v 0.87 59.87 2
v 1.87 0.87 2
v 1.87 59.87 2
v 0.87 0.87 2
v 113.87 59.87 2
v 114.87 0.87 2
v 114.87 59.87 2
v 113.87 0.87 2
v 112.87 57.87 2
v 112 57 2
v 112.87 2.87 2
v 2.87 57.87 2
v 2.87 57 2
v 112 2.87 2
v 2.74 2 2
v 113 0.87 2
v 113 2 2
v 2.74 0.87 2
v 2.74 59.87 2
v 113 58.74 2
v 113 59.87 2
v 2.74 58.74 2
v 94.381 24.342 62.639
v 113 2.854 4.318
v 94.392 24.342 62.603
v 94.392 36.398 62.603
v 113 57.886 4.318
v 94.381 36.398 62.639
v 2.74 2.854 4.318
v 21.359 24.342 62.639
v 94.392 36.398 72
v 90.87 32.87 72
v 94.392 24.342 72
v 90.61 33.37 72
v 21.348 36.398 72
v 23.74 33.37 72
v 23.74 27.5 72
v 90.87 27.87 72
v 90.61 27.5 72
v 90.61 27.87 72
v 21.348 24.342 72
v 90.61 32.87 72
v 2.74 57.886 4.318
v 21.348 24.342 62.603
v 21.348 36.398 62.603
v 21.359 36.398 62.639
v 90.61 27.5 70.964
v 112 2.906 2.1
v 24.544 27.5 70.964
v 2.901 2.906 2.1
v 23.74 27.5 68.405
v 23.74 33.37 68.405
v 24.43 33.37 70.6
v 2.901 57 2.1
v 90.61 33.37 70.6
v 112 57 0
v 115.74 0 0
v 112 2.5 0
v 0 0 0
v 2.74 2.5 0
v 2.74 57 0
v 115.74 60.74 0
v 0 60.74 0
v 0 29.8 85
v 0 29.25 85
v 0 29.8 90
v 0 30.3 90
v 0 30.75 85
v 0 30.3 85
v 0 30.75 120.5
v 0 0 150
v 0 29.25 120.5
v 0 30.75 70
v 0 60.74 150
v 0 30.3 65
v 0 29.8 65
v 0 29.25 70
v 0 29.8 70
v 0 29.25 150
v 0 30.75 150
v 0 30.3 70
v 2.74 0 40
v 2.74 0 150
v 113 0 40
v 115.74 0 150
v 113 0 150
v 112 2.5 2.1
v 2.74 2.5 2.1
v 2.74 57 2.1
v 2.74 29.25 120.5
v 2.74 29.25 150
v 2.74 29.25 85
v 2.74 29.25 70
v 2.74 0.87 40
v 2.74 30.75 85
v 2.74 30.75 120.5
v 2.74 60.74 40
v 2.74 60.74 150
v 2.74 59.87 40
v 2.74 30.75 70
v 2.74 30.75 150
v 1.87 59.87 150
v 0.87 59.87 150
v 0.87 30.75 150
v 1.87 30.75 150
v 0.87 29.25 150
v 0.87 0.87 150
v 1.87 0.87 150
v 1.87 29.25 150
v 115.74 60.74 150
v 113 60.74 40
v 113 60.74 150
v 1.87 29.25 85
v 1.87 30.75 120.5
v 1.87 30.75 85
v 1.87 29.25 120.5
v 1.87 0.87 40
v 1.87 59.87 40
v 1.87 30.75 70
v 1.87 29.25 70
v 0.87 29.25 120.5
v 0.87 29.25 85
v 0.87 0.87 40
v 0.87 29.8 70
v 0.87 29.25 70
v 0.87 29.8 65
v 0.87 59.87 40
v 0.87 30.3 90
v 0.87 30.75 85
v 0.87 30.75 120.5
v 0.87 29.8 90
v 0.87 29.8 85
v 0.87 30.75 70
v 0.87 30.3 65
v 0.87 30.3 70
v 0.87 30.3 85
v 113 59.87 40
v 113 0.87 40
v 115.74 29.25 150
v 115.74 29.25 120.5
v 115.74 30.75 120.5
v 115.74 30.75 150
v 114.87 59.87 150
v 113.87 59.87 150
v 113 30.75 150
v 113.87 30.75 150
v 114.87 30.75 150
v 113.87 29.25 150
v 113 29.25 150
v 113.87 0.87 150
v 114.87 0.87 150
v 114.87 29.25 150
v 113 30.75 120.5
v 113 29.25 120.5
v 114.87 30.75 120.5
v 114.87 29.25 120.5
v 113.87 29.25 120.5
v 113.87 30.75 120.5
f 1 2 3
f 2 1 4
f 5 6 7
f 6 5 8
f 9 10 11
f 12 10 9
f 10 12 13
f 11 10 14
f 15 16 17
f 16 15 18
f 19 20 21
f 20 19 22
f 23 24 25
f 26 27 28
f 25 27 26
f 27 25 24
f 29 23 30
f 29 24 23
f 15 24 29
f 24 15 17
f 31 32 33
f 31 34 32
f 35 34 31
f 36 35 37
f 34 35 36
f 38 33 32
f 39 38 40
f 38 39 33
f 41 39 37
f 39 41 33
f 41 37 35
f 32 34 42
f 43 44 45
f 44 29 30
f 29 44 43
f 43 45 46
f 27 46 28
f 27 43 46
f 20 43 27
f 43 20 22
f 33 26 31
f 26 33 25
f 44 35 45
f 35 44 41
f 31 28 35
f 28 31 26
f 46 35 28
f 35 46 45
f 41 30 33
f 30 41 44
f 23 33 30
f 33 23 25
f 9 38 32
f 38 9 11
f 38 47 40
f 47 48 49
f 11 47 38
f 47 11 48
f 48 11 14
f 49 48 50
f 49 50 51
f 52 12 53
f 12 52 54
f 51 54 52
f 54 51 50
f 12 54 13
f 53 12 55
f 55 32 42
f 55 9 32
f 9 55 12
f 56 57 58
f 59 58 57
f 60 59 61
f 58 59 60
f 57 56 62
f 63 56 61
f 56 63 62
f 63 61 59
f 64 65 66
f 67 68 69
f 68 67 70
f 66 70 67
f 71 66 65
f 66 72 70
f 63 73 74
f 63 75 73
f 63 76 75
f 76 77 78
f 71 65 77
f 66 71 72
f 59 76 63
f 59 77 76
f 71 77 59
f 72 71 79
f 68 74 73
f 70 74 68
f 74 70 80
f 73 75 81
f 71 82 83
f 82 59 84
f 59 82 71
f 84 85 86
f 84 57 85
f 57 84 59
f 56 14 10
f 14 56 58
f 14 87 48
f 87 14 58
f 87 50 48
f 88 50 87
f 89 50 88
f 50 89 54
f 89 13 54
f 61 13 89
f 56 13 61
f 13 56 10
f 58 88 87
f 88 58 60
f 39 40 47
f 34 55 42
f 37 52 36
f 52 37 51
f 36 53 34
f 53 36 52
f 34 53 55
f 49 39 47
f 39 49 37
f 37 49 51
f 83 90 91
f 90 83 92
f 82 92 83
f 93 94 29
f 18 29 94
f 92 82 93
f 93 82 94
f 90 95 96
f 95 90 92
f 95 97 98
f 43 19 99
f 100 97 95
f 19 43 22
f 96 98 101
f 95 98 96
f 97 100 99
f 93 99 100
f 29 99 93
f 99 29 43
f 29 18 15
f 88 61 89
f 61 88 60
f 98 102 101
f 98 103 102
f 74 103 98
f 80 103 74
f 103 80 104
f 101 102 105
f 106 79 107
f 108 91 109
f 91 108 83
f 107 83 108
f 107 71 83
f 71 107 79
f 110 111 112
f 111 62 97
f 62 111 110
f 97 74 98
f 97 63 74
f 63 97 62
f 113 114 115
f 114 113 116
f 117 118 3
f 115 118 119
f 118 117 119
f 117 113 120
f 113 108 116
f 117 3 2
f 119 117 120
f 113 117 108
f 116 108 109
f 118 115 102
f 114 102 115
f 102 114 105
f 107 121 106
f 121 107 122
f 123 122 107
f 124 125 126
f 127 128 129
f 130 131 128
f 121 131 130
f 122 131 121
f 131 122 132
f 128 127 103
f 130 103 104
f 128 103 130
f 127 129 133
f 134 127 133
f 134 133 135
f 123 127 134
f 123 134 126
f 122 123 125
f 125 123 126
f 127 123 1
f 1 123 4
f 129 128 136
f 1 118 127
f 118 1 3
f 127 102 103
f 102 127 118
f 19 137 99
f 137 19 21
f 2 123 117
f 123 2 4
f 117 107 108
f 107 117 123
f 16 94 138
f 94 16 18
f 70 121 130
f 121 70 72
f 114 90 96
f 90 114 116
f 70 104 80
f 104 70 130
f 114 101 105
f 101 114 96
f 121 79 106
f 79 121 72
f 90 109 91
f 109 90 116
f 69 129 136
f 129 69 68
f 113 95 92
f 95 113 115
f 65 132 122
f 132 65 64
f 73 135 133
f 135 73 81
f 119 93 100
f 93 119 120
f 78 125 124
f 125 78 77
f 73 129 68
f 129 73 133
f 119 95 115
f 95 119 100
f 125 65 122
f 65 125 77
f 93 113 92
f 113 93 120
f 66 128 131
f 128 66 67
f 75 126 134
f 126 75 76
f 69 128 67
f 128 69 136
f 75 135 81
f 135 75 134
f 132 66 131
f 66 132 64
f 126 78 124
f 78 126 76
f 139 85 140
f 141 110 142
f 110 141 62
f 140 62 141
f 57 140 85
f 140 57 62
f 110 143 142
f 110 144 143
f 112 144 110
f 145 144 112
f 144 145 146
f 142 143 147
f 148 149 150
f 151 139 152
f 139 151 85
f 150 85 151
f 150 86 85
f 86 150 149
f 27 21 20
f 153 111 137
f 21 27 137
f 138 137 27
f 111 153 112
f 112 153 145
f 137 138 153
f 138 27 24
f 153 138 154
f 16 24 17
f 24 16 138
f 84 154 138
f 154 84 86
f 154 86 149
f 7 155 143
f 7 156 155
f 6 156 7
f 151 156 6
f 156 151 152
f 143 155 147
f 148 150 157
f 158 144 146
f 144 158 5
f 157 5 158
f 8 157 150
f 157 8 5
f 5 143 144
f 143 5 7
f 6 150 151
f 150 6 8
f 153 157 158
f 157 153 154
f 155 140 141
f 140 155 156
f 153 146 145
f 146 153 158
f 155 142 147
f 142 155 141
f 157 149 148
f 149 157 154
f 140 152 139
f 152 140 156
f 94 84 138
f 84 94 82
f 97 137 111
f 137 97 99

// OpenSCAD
length = 110;
width = 55;
height = 70;
wall = 0.87;

module funnel(l, w, h, out = false) {
    ls = l/5; // length shrink
    ws = 5*(w/11); // width shrink
    CubePoints = [
    [  0,  0,  0 ],  //0
    [ l,  0,  0 ],  //1
    [ l,  w,  0 ],  //2
    [  0,  w,  0 ],  //3
    [  0 + ls,  0 + ws,  h ],  //4
    [  l - ls,  0 + ws,  h ],  //5
    [  l - ls,  w - ws,  h ],  //6
    [  0 + ls,  w - ws,  h ]]; //7
  
    CubeFaces = [
    [0,1,2,3],  // bottom
    [4,5,1,0],  // front
    [7,6,5,4],  // top
    [5,6,2,1],  // right
    [6,7,3,2],  // back
    [7,4,0,3]]; // left
    if(out){
        union(){
            polyhedron( CubePoints, CubeFaces );
            translate([l/2,w/2,h-5])
            cube([3/5*l+6, 2*w/11 + 2*wall, 10],true);
        }
    } else {
        polyhedron( CubePoints, CubeFaces );
    }
}

module pilar(){
    difference(){
        difference(){
            cube([2*wall + 1, width + 4 + 2*wall, height + 80], false);
            translate([wall, wall, 2])cube([1,width+4,height+80],false);
        }
       translate([-wall, width/2 + 1.75, height + 80 - 29.5]) cube([10, 1.5, 30], false);
    }  
}

module sidewall(){
    cube([length + 3 ,wall,40], false);
}

// Create top
union(){
    difference(){
        union(){
            // Funnel edge
            cube([length+5, width+5, 2], false);
            // Create funnel and translate
            translate([2,2,2])
            difference() {
                funnel(length + 2*wall, width + 2*wall, height, out = true);
                translate([wall, wall, 0])
                    funnel(length, width, height);
            }
        }
        union(){
            // Funnel mouth
            translate([2.5,2.5,-.5])
            cube([length-.5, width-.5, 2.6], false);
            // Lower outlet
            translate([1*length/5 + 2*wall, width/2 , height/2 + wall])
            cube([3/5*length + wall, width/11 + wall, 100],false);
        }
    }
// Pilar with slot for reed relay
    difference(){
        pilar();
        translate([-wall, width/2 + 1.75, height])
        union(){
            cube([10, 1.5, 15], false);
            translate([0, 0.55, -5]) cube([2, 0.5, 25], false);
        }
    }
    translate([length + 3,0,0]) pilar();
    sidewall();
    translate([0,width + 4 + wall, 0]) sidewall();
}
